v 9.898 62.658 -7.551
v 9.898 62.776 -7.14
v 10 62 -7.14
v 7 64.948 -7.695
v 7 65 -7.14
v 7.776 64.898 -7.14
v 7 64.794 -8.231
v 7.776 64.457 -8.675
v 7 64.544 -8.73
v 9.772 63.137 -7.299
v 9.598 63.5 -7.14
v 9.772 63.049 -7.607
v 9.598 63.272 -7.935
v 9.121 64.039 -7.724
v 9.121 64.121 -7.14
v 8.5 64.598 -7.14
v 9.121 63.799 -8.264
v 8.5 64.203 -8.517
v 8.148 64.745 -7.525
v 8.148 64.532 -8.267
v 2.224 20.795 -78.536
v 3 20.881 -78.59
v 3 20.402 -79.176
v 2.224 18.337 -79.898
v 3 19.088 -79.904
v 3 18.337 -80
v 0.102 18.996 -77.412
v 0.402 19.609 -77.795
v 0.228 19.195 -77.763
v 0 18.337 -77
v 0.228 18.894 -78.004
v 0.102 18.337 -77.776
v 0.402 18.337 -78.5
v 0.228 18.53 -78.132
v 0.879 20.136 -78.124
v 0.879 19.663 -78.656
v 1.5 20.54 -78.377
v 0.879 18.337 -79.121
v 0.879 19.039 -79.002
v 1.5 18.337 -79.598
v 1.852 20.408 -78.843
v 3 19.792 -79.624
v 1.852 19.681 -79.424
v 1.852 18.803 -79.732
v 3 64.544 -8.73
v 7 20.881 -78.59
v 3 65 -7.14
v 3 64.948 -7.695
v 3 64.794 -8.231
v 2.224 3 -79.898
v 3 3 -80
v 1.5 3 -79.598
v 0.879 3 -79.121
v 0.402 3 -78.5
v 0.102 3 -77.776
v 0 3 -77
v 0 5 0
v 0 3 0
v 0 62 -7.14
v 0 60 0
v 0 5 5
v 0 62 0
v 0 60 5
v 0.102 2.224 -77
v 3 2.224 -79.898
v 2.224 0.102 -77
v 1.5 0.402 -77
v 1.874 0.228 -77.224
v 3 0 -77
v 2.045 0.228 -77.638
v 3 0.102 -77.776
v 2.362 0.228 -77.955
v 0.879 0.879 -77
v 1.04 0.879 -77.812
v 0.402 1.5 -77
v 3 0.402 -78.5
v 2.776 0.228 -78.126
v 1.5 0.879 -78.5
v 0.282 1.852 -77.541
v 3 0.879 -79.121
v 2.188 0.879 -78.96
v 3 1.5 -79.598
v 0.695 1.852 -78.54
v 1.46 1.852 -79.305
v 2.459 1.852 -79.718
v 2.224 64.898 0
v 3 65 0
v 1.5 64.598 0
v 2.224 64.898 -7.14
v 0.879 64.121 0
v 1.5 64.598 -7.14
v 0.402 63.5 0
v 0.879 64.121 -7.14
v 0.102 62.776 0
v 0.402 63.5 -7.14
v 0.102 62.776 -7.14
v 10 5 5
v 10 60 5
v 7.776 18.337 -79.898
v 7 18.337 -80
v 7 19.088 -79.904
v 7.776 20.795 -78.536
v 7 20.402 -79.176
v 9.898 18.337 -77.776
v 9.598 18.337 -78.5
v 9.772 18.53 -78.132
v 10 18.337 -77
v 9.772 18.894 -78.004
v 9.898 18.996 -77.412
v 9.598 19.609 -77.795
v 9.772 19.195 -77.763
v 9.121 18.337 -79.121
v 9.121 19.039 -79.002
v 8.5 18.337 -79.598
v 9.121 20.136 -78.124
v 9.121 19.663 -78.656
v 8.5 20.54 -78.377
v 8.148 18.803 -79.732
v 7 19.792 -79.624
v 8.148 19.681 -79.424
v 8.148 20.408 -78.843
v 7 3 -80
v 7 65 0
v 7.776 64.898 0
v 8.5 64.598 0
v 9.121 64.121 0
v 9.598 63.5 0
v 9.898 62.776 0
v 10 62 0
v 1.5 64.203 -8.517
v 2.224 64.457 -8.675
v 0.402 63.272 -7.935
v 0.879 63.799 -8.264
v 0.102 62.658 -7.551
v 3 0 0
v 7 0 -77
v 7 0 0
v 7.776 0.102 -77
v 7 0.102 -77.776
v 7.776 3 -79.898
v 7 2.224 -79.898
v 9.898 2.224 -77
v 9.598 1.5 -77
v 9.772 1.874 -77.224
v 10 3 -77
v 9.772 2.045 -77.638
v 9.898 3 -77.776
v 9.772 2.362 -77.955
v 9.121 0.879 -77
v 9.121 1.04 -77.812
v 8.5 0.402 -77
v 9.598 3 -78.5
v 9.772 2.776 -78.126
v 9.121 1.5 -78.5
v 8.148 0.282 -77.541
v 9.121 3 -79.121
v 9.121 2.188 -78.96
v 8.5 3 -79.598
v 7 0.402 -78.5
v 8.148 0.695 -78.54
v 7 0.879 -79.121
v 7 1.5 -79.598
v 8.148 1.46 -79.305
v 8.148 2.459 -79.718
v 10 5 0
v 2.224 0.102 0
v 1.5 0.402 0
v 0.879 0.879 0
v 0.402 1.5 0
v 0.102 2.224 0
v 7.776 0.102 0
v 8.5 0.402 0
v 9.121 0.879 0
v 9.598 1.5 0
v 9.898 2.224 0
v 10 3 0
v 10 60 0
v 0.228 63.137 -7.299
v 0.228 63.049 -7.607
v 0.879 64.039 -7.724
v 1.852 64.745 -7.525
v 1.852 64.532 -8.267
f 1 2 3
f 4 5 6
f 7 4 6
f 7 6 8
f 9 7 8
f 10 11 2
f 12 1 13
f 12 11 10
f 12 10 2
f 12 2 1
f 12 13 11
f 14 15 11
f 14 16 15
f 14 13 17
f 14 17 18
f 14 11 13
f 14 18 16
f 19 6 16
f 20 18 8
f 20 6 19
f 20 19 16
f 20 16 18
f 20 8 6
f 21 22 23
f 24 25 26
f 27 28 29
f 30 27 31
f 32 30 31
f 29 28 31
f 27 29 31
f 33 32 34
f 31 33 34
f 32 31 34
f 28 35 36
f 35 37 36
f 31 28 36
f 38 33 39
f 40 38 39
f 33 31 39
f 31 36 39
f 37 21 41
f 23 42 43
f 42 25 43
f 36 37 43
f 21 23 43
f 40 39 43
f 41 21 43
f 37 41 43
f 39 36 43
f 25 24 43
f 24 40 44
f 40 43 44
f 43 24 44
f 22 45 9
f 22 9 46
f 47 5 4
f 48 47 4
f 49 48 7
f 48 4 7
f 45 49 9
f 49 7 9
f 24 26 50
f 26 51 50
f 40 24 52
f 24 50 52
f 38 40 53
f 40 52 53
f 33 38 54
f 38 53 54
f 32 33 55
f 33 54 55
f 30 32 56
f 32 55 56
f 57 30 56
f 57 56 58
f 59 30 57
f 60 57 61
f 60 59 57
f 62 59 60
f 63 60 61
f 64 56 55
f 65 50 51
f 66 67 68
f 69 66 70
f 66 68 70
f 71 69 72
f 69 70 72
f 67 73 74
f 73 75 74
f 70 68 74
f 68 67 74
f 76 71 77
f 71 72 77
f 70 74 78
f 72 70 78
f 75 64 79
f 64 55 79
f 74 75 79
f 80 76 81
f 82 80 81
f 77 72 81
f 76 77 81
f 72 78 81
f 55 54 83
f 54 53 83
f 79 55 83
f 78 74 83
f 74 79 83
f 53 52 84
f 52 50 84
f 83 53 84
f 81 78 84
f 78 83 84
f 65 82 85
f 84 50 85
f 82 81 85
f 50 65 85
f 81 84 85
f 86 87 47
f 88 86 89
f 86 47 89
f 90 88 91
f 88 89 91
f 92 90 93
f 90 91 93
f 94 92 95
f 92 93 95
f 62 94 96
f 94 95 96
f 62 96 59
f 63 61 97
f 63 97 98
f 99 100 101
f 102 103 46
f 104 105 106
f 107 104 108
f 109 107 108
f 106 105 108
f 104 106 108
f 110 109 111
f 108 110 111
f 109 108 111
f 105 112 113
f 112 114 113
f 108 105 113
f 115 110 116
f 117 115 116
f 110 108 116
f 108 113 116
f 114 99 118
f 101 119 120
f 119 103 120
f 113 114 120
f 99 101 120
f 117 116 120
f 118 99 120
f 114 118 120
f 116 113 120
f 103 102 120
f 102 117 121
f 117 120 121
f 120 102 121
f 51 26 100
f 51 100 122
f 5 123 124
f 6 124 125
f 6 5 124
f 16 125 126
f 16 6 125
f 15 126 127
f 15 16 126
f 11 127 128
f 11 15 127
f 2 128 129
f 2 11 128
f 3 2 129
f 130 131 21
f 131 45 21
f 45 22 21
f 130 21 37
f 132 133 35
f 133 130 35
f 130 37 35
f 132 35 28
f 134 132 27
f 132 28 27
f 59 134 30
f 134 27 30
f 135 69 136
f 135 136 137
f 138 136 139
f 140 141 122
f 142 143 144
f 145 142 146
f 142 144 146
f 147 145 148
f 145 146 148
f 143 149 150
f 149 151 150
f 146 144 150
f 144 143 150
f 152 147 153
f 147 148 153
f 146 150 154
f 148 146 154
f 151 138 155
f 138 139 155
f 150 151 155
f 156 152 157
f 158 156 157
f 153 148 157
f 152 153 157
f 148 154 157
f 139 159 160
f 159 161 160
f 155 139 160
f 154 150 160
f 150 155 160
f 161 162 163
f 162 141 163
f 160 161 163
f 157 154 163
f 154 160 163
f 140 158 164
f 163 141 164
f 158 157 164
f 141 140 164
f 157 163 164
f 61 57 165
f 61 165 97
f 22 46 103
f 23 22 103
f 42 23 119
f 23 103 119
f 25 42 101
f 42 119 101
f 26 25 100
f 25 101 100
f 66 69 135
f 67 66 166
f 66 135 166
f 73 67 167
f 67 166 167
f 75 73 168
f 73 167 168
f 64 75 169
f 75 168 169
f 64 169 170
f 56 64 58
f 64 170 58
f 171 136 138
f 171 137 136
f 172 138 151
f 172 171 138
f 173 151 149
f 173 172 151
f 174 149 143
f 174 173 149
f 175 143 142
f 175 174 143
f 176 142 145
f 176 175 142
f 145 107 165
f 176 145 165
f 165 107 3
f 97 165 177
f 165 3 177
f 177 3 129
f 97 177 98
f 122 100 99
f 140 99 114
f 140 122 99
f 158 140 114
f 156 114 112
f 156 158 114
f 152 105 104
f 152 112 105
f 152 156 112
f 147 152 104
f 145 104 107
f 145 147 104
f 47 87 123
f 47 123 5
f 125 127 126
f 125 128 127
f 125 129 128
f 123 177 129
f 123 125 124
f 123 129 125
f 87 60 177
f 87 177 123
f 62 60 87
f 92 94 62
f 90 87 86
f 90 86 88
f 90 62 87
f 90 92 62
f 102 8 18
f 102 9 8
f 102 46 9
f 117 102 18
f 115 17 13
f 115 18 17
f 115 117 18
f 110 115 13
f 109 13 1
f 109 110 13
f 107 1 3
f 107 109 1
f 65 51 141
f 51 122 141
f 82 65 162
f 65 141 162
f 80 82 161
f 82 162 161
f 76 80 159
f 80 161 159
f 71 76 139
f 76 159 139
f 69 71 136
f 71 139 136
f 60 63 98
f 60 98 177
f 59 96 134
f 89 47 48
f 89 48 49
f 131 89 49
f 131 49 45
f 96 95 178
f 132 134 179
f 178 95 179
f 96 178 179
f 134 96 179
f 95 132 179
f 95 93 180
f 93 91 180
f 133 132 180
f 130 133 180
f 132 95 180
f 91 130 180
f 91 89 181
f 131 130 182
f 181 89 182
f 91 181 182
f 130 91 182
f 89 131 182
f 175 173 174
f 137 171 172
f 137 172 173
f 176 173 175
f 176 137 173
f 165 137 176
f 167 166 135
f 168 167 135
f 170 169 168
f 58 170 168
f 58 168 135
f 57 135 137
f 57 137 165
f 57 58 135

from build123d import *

# Parameters (mm, degrees)
BOSS_EXTRUDE5_DEPTH = 10
FILLET1_R           = 3


with BuildPart() as part:
    # Sketch7 → Boss-Extrude5 (new body)
    with BuildSketch(Plane(origin=(0, 0, 0), x_dir=(0, 0, -1), z_dir=(1, 0, 0))):
        Polygon((0, 0), (0, 5), (-5, 5), (-5, 60), (0, 60), (0, 65), (8, 65), (80, 20), (80, 0), align=None)
    extrude(amount=BOSS_EXTRUDE5_DEPTH)

    # Fillet1
    fillet1_edges = [part.edges().sort_by_distance(p)[0] for p in [
        (0, 65, -4),
        (0, 42.5, -44),
        (0, 10, -80),
        (0, 0, -40),
        (10, 42.5, -44),
        (5, 65, -8),
        (5, 20, -80),
        (5, 0, -80),
        (10, 65, -4),
        (10, 0, -40),
        (10, 10, -80),
    ]]
    fillet(fillet1_edges, radius=FILLET1_R)


solid = part.part
